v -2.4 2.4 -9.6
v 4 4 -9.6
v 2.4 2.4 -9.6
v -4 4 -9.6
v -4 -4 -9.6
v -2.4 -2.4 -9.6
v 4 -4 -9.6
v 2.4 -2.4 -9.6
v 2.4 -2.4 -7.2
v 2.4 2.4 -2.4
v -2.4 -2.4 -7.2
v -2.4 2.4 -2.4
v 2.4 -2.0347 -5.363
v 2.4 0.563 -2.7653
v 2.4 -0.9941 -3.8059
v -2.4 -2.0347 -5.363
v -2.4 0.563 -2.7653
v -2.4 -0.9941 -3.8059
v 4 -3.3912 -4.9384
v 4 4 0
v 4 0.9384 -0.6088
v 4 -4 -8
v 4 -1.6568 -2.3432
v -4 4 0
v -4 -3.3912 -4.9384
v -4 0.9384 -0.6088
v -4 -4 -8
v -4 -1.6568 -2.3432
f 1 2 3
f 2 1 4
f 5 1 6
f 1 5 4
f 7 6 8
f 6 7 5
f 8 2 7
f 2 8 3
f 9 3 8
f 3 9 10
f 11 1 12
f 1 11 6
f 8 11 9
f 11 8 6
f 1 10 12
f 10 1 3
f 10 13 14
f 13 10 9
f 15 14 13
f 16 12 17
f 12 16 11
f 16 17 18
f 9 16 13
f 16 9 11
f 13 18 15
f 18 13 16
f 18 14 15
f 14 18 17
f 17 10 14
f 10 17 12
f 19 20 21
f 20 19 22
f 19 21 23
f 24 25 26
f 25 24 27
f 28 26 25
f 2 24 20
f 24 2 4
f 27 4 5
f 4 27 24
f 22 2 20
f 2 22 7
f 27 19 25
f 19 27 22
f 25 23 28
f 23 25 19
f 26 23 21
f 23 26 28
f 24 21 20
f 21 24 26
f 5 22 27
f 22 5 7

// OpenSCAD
// file: ../p/recte4.scad
use <../lib.scad>
function ldraw_lib__recte4() = [
// 0 Rectangle Empty with 4 Edges
// 0 Name: recte4.dat
// 0 Author: Steffen [Steffen]
// 0 !LDRAW_ORG Primitive UPDATE 2010-03
// 0 !LICENSE Licensed under CC BY 4.0 : see CAreadme.txt
// 
// 0 BFC CERTIFY CCW
  [0,"BFC","CERTIFY"],
  [0,"BFC","CCW"],
// 
// 0 !HISTORY 2010-12-31 [PTadmin] Official Update 2010-03
// 
// 
// 2 24 1 0 1 -1 0 1
  [2,24,1,0,1,-1,0,1],
// 2 24 -1 0 1 -1 0 -1
  [2,24,-1,0,1,-1,0,-1],
// 2 24 -1 0 -1 1 0 -1
  [2,24,-1,0,-1,1,0,-1],
// 2 24 1 0 -1 1 0 1
  [2,24,1,0,-1,1,0,1],
];
module ldraw_lib__recte4(step=0, col=false, unit=2/5, alt=false, line=0.2, solid=!$preview)
    makepoly(ldraw_lib__recte4(), step=step, col=col, unit=unit, alt=alt, line=line, solid=solid);
ldraw_lib__recte4(line=0.2);
// file: ../p/rect3.scad
use <../lib.scad>
function ldraw_lib__rect3() = [
// 0 Rectangle with 3 Edges
// 0 Name: rect3.dat
// 0 Author: Mark Kennedy [mkennedy]
// 0 !LDRAW_ORG Primitive UPDATE 2010-01
// 0 !LICENSE Licensed under CC BY 4.0 : see CAreadme.txt
// 
// 0 BFC CERTIFY CCW
  [0,"BFC","CERTIFY"],
  [0,"BFC","CCW"],
// 
// 0 !HISTORY 2003-08-01 [PTadmin] Official Update 2003-02
// 0 !HISTORY 2007-06-24 [PTadmin] Header formatted for Contributor Agreement
// 0 !HISTORY 2008-07-01 [PTadmin] Official Update 2008-01
// 0 !HISTORY 2010-01-17 [mikeheide] Change winding to CCW
// 0 !HISTORY 2010-04-05 [PTadmin] Official Update 2010-01
// 
// 
// 2 24 1 0 1 -1 0 1
  [2,24,1,0,1,-1,0,1],
// 2 24 1 0 1 1 0 -1
  [2,24,1,0,1,1,0,-1],
// 2 24 -1 0 1 -1 0 -1
  [2,24,-1,0,1,-1,0,-1],
// 4 16 -1 0 1 -1 0 -1 1 0 -1 1 0 1
  [4,16,-1,0,1,-1,0,-1,1,0,-1,1,0,1],
// 0 //
];
module ldraw_lib__rect3(step=0, col=false, unit=2/5, alt=false, line=0.2, solid=!$preview)
    makepoly(ldraw_lib__rect3(), step=step, col=col, unit=unit, alt=alt, line=line, solid=solid);
ldraw_lib__rect3(line=0.2);
// file: ../p/rect2p.scad
use <../lib.scad>
function ldraw_lib__rect2p() = [
// 0 Rectangle with 2 Parallel Edges
// 0 Name: rect2p.dat
// 0 Author: Donald Sutter [technog]
// 0 !LDRAW_ORG Primitive UPDATE 2010-01
// 0 !LICENSE Licensed under CC BY 4.0 : see CAreadme.txt
// 
// 0 BFC CERTIFY CCW
  [0,"BFC","CERTIFY"],
  [0,"BFC","CCW"],
// 
// 0 !HISTORY 2003-08-01 [PTadmin] Official Update 2003-02
// 0 !HISTORY 2007-06-24 [PTadmin] Header formatted for Contributor Agreement
// 0 !HISTORY 2008-07-01 [PTadmin] Official Update 2008-01
// 0 !HISTORY 2010-01-17 [mikeheide] changed winding to CCW
// 0 !HISTORY 2010-04-05 [PTadmin] Official Update 2010-01
// 
// 
// 2 24 1 0 1 -1 0 1
  [2,24,1,0,1,-1,0,1],
// 2 24 -1 0 -1 1 0 -1
  [2,24,-1,0,-1,1,0,-1],
// 4 16 -1 0 1 -1 0 -1 1 0 -1 1 0 1
  [4,16,-1,0,1,-1,0,-1,1,0,-1,1,0,1],
// 0
];
module ldraw_lib__rect2p(step=0, col=false, unit=2/5, alt=false, line=0.2, solid=!$preview)
    makepoly(ldraw_lib__rect2p(), step=step, col=col, unit=unit, alt=alt, line=line, solid=solid);
ldraw_lib__rect2p(line=0.2);
// file: ../p/1-4edge.scad
use <../lib.scad>
function ldraw_lib__1_4edge() = [
// 0 Circle 0.25
// 0 Name: 1-4edge.dat
// 0 Author: James Jessiman
// 0 !LDRAW_ORG Primitive UPDATE 2017-01
// 0 !LICENSE Licensed under CC BY 4.0 : see CAreadme.txt
// 
// 0 BFC CERTIFY CCW
  [0,"BFC","CERTIFY"],
  [0,"BFC","CCW"],
// 
// 0 !HISTORY 2007-06-22 [PTadmin] Header formatted for Contributor Agreement
// 0 !HISTORY 2008-07-01 [PTadmin] Official Update 2008-01
// 0 !HISTORY 2017-01-15 [Steffen] BFCed
// 0 !HISTORY 2017-12-30 [PTadmin] Official Update 2017-01
// 
// 
// 2 24 1 0 0 0.9239 0 0.3827
  [2,24,1,0,0,0.9239,0,0.3827],
// 2 24 0.9239 0 0.3827 0.7071 0 0.7071
  [2,24,0.9239,0,0.3827,0.7071,0,0.7071],
// 2 24 0.7071 0 0.7071 0.3827 0 0.9239
  [2,24,0.7071,0,0.7071,0.3827,0,0.9239],
// 2 24 0.3827 0 0.9239 0 0 1
  [2,24,0.3827,0,0.9239,0,0,1],
];
module ldraw_lib__1_4edge(step=0, col=false, unit=2/5, alt=false, line=0.2, solid=!$preview)
    makepoly(ldraw_lib__1_4edge(), step=step, col=col, unit=unit, alt=alt, line=line, solid=solid);
ldraw_lib__1_4edge(line=0.2);
// file: ../p/1-4cylo.scad
use <../lib.scad>
use <1-4cyli.scad>
use <1-4edge.scad>
function ldraw_lib__1_4cylo() = [
// 0 Cylinder Open 0.25
// 0 Name: 1-4cylo.dat
// 0 Author: Max Martin Richter [MMR1988]
// 0 !LDRAW_ORG Primitive UPDATE 2010-03
// 0 !LICENSE Licensed under CC BY 4.0 : see CAreadme.txt
// 
// 0 BFC CERTIFY CCW
  [0,"BFC","CERTIFY"],
  [0,"BFC","CCW"],
// 
// 0 !HISTORY 2010-12-31 [PTadmin] Official Update 2010-03
// 
// 
// 1 16 0 0 0 1 0 0 0 1 0 0 0 1 1-4edge.dat
  [1,16,0,0,0,1,0,0,0,1,0,0,0,1, ldraw_lib__1_4edge()],
// 1 16 0 1 0 1 0 0 0 1 0 0 0 1 1-4edge.dat
  [1,16,0,1,0,1,0,0,0,1,0,0,0,1, ldraw_lib__1_4edge()],
// 1 16 0 0 0 1 0 0 0 1 0 0 0 1 1-4cyli.dat
  [1,16,0,0,0,1,0,0,0,1,0,0,0,1, ldraw_lib__1_4cyli()],
];
module ldraw_lib__1_4cylo(step=0, col=false, unit=2/5, alt=false, line=0.2, solid=!$preview)
    makepoly(ldraw_lib__1_4cylo(), step=step, col=col, unit=unit, alt=alt, line=line, solid=solid);
ldraw_lib__1_4cylo(line=0.2);
// file: ../p/1-4chrd.scad
use <../lib.scad>
function ldraw_lib__1_4chrd() = [
// 0 Chord 0.25
// 0 Name: 1-4chrd.dat
// 0 Author: Max Martin Richter [MMR1988]
// 0 !LDRAW_ORG Primitive UPDATE 2023-05
// 0 !LICENSE Licensed under CC BY 4.0 : see CAreadme.txt
// 
// 0 BFC CERTIFY CCW
  [0,"BFC","CERTIFY"],
  [0,"BFC","CCW"],
// 
// 0 !HISTORY 2004-04-22 [PTadmin] Official Update 2004-02
// 0 !HISTORY 2007-10-09 [PTadmin] Header formatted for Contributor Agreement
// 0 !HISTORY 2008-07-01 [PTadmin] Official Update 2008-01
// 0 !HISTORY 2012-08-02 [MMR1988] Re-creation with PrimGen2 and Rectifier
// 0 !HISTORY 2012-08-09 [PTadmin] Official Update 2012-02
// 0 !HISTORY 2023-10-27 [OrionP] Change author to MMR1988 from hafhead
// 0 !HISTORY 2023-10-31 [OrionP] Official Update 2023-05
// 
// 4 16 0.9239 0 0.3827 0.3827 0 0.9239 0 0 1 1 0 0
  [4,16,0.9239,0,0.3827,0.3827,0,0.9239,0,0,1,1,0,0],
// 3 16 0.7071 0 0.7071 0.3827 0 0.9239 0.9239 0 0.3827
  [3,16,0.7071,0,0.7071,0.3827,0,0.9239,0.9239,0,0.3827],
];
module ldraw_lib__1_4chrd(step=0, col=false, unit=2/5, alt=false, line=0.2, solid=!$preview)
    makepoly(ldraw_lib__1_4chrd(), step=step, col=col, unit=unit, alt=alt, line=line, solid=solid);
ldraw_lib__1_4chrd(line=0.2);
// file: s/7126s01.scad
use <../../lib.scad>
use <../../p/1-4chrd.scad>
use <../../p/1-4cylo.scad>
use <../../p/1-4edge.scad>
use <../../p/rect2p.scad>
use <../../p/rect3.scad>
use <../../p/recte4.scad>
function ldraw_lib__s__7126s01() = [
// 0 ~Brick  1 x  1 with Curved Top without Patternable Surfaces
// 0 Name: s\7126s01.dat
// 0 Author: Gerald Lasser [GeraldLasser]
// 0 !LDRAW_ORG Subpart UPDATE 2025-05
// 0 !LICENSE Licensed under CC BY 4.0 : see CAreadme.txt
// 
// 0 BFC CERTIFY CCW
  [0,"BFC","CERTIFY"],
  [0,"BFC","CCW"],
// 
// 0 !HISTORY 2025-05-28 [OrionP] Official Update 2025-05
// 
// 4 16 10 24 10 6 24 6 -6 24 6 -10 24 10
  [4,16,10,24,10,6,24,6,-6,24,6,-10,24,10],
// 4 16 -10 24 10 -6 24 6 -6 24 -6 -10 24 -10
  [4,16,-10,24,10,-6,24,6,-6,24,-6,-10,24,-10],
// 4 16 -10 24 -10 -6 24 -6 6 24 -6 10 24 -10
  [4,16,-10,24,-10,-6,24,-6,6,24,-6,10,24,-10],
// 4 16 10 24 -10 6 24 -6 6 24 6 10 24 10
  [4,16,10,24,-10,6,24,-6,6,24,6,10,24,10],
// 1 16 0 24 0 6 0 0 0 1 0 0 0 6 recte4.dat
  [1,16,0,24,0,6,0,0,0,1,0,0,0,6, ldraw_lib__recte4()],
// 1 16 0 24 0 10 0 0 0 1 0 0 0 10 recte4.dat
  [1,16,0,24,0,10,0,0,0,1,0,0,0,10, ldraw_lib__recte4()],
// 
// 4 16 6 6 6 6 24 6 6 24 -6 6 18 -6
  [4,16,6,6,6,6,24,6,6,24,-6,6,18,-6],
// 4 16 -6 18 -6 -6 24 -6 -6 24 6 -6 6 6
  [4,16,-6,18,-6,-6,24,-6,-6,24,6,-6,6,6],
// 1 16 0 21 -6 0 0 6 -3 0 0 0 -1 0 rect2p.dat
  [1,16,0,21,-6,0,0,6,-3,0,0,0,-1,0, ldraw_lib__rect2p()],
// 1 16 0 15 6 6 0 0 0 0 -9 0 1 0 rect3.dat
  [1,16,0,15,6,6,0,0,0,0,-9,0,1,0, ldraw_lib__rect3()],
// 1 16 6 18 6 0 1 0 0 0 -12 -12 0 0 1-4chrd.dat
  [1,16,6,18,6,0,1,0,0,0,-12,-12,0,0, ldraw_lib__1_4chrd()],
// 1 16 -6 18 6 0 -1 0 0 0 -12 -12 0 0 1-4chrd.dat
  [1,16,-6,18,6,0,-1,0,0,0,-12,-12,0,0, ldraw_lib__1_4chrd()],
// 0 BFC INVERTNEXT
  [0,"BFC","INVERTNEXT"],
// 1 16 6 18 6 0 -12 0 0 0 -12 -12 0 0 1-4cylo.dat
  [1,16,6,18,6,0,-12,0,0,0,-12,-12,0,0, ldraw_lib__1_4cylo()],
// 
// 1 16 10 20 10 0 -1 0 0 0 -20 -20 0 0 1-4chrd.dat
  [1,16,10,20,10,0,-1,0,0,0,-20,-20,0,0, ldraw_lib__1_4chrd()],
// 1 16 -10 20 10 0 1 0 0 0 -20 -20 0 0 1-4chrd.dat
  [1,16,-10,20,10,0,1,0,0,0,-20,-20,0,0, ldraw_lib__1_4chrd()],
// 1 16 10 20 10 0 -1 0 0 0 -20 -20 0 0 1-4edge.dat
  [1,16,10,20,10,0,-1,0,0,0,-20,-20,0,0, ldraw_lib__1_4edge()],
// 1 16 -10 20 10 0 -1 0 0 0 -20 -20 0 0 1-4edge.dat
  [1,16,-10,20,10,0,-1,0,0,0,-20,-20,0,0, ldraw_lib__1_4edge()],
// 1 16 0 12 10 -10 0 0 0 0 -12 0 -1 0 rect3.dat
  [1,16,0,12,10,-10,0,0,0,0,-12,0,-1,0, ldraw_lib__rect3()],
// 4 16 -10 24 10 -10 24 -10 -10 20 -10 -10 0 10
  [4,16,-10,24,10,-10,24,-10,-10,20,-10,-10,0,10],
// 4 16 10 24 -10 10 24 10 10 0 10 10 20 -10
  [4,16,10,24,-10,10,24,10,10,0,10,10,20,-10],
// 2 24 -10 24 -10 -10 20 -10
  [2,24,-10,24,-10,-10,20,-10],
// 2 24 10 24 -10 10 20 -10
  [2,24,10,24,-10,10,20,-10],
];
module ldraw_lib__s__7126s01(step=0, col=false, unit=2/5, alt=false, line=0.2, solid=!$preview)
    makepoly(ldraw_lib__s__7126s01(), step=step, col=col, unit=unit, alt=alt, line=line, solid=solid);
ldraw_lib__s__7126s01(line=0.2);
// file: ../p/1-4cyli.scad
use <../lib.scad>
function ldraw_lib__1_4cyli() = [
// 0 Cylinder 0.25
// 0 Name: 1-4cyli.dat
// 0 Author: James Jessiman
// 0 !LDRAW_ORG Primitive UPDATE 2012-01
// 0 !LICENSE Licensed under CC BY 4.0 : see CAreadme.txt
// 
// 0 BFC CERTIFY CCW
  [0,"BFC","CERTIFY"],
  [0,"BFC","CCW"],
// 
// 0 !HISTORY 2002-03-23 [sbliss] Added BFC statement.
// 0 !HISTORY 2002-04-25 [PTadmin] Official Update 2002-02
// 0 !HISTORY 2007-06-22 [PTadmin] Header formatted for Contributor Agreement
// 0 !HISTORY 2008-07-01 [PTadmin] Official Update 2008-01
// 0 !HISTORY 2012-02-16 [Philo] Changed to CCW
// 0 !HISTORY 2012-03-30 [PTadmin] Official Update 2012-01
// 
// 
// 4 16 1 1 0 0.9239 1 0.3827 0.9239 0 0.3827 1 0 0
  [4,16,1,1,0,0.9239,1,0.3827,0.9239,0,0.3827,1,0,0],
// 5 24 1 0 0 1 1 0 0.9239 0 0.3827 1 0 -1
  [5,24,1,0,0,1,1,0,0.9239,0,0.3827,1,0,-1],
// 4 16 0.9239 1 0.3827 0.7071 1 0.7071 0.7071 0 0.7071 0.9239 0 0.3827
  [4,16,0.9239,1,0.3827,0.7071,1,0.7071,0.7071,0,0.7071,0.9239,0,0.3827],
// 5 24 0.9239 0 0.3827 0.9239 1 0.3827 0.7071 0 0.7071 1 0 0
  [5,24,0.9239,0,0.3827,0.9239,1,0.3827,0.7071,0,0.7071,1,0,0],
// 4 16 0.7071 1 0.7071 0.3827 1 0.9239 0.3827 0 0.9239 0.7071 0 0.7071
  [4,16,0.7071,1,0.7071,0.3827,1,0.9239,0.3827,0,0.9239,0.7071,0,0.7071],
// 5 24 0.7071 0 0.7071 0.7071 1 0.7071 0.3827 0 0.9239 0.9239 0 0.3827
  [5,24,0.7071,0,0.7071,0.7071,1,0.7071,0.3827,0,0.9239,0.9239,0,0.3827],
// 4 16 0.3827 1 0.9239 0 1 1 0 0 1 0.3827 0 0.9239
  [4,16,0.3827,1,0.9239,0,1,1,0,0,1,0.3827,0,0.9239],
// 5 24 0.3827 0 0.9239 0.3827 1 0.9239 0 0 1 0.7071 0 0.7071
  [5,24,0.3827,0,0.9239,0.3827,1,0.9239,0,0,1,0.7071,0,0.7071],
// 5 24 0 0 1 0 1 1 0.3827 0 0.9239 -1 0 1
  [5,24,0,0,1,0,1,1,0.3827,0,0.9239,-1,0,1],
];
module ldraw_lib__1_4cyli(step=0, col=false, unit=2/5, alt=false, line=0.2, solid=!$preview)
    makepoly(ldraw_lib__1_4cyli(), step=step, col=col, unit=unit, alt=alt, line=line, solid=solid);
ldraw_lib__1_4cyli(line=0.2);
// main file
use <../lib.scad>
use <../p/1-4cyli.scad>
use <s/7126s01.scad>
function ldraw_lib__7126() = [
// 0 Brick  1 x  1 with Curved Top
// 0 Name: 7126.dat
// 0 Author: Gerald Lasser [GeraldLasser]
// 0 !LDRAW_ORG Part UPDATE 2025-05
// 0 !LICENSE Licensed under CC BY 4.0 : see CAreadme.txt
// 
// 0 BFC CERTIFY CCW
  [0,"BFC","CERTIFY"],
  [0,"BFC","CCW"],
// 
// 0 !HISTORY 2025-05-28 [OrionP] Official Update 2025-05
// 
// 1 16 0 0 0 1 0 0 0 1 0 0 0 1 s\7126s01.dat
  [1,16,0,0,0,1,0,0,0,1,0,0,0,1, ldraw_lib__s__7126s01()],
// 
// 1 16 10 20 10 0 -20 0 0 0 -20 -20 0 0 1-4cyli.dat
  [1,16,10,20,10,0,-20,0,0,0,-20,-20,0,0, ldraw_lib__1_4cyli()],
// 4 16 10 24 -10 10 20 -10 -10 20 -10 -10 24 -10
  [4,16,10,24,-10,10,20,-10,-10,20,-10,-10,24,-10],
];
module ldraw_lib__7126(step=0, col=false, unit=2/5, alt=false, line=0.2, solid=!$preview)
    makepoly(ldraw_lib__7126(), step=step, col=col, unit=unit, alt=alt, line=line, solid=solid);
ldraw_lib__7126(line=0.2);
